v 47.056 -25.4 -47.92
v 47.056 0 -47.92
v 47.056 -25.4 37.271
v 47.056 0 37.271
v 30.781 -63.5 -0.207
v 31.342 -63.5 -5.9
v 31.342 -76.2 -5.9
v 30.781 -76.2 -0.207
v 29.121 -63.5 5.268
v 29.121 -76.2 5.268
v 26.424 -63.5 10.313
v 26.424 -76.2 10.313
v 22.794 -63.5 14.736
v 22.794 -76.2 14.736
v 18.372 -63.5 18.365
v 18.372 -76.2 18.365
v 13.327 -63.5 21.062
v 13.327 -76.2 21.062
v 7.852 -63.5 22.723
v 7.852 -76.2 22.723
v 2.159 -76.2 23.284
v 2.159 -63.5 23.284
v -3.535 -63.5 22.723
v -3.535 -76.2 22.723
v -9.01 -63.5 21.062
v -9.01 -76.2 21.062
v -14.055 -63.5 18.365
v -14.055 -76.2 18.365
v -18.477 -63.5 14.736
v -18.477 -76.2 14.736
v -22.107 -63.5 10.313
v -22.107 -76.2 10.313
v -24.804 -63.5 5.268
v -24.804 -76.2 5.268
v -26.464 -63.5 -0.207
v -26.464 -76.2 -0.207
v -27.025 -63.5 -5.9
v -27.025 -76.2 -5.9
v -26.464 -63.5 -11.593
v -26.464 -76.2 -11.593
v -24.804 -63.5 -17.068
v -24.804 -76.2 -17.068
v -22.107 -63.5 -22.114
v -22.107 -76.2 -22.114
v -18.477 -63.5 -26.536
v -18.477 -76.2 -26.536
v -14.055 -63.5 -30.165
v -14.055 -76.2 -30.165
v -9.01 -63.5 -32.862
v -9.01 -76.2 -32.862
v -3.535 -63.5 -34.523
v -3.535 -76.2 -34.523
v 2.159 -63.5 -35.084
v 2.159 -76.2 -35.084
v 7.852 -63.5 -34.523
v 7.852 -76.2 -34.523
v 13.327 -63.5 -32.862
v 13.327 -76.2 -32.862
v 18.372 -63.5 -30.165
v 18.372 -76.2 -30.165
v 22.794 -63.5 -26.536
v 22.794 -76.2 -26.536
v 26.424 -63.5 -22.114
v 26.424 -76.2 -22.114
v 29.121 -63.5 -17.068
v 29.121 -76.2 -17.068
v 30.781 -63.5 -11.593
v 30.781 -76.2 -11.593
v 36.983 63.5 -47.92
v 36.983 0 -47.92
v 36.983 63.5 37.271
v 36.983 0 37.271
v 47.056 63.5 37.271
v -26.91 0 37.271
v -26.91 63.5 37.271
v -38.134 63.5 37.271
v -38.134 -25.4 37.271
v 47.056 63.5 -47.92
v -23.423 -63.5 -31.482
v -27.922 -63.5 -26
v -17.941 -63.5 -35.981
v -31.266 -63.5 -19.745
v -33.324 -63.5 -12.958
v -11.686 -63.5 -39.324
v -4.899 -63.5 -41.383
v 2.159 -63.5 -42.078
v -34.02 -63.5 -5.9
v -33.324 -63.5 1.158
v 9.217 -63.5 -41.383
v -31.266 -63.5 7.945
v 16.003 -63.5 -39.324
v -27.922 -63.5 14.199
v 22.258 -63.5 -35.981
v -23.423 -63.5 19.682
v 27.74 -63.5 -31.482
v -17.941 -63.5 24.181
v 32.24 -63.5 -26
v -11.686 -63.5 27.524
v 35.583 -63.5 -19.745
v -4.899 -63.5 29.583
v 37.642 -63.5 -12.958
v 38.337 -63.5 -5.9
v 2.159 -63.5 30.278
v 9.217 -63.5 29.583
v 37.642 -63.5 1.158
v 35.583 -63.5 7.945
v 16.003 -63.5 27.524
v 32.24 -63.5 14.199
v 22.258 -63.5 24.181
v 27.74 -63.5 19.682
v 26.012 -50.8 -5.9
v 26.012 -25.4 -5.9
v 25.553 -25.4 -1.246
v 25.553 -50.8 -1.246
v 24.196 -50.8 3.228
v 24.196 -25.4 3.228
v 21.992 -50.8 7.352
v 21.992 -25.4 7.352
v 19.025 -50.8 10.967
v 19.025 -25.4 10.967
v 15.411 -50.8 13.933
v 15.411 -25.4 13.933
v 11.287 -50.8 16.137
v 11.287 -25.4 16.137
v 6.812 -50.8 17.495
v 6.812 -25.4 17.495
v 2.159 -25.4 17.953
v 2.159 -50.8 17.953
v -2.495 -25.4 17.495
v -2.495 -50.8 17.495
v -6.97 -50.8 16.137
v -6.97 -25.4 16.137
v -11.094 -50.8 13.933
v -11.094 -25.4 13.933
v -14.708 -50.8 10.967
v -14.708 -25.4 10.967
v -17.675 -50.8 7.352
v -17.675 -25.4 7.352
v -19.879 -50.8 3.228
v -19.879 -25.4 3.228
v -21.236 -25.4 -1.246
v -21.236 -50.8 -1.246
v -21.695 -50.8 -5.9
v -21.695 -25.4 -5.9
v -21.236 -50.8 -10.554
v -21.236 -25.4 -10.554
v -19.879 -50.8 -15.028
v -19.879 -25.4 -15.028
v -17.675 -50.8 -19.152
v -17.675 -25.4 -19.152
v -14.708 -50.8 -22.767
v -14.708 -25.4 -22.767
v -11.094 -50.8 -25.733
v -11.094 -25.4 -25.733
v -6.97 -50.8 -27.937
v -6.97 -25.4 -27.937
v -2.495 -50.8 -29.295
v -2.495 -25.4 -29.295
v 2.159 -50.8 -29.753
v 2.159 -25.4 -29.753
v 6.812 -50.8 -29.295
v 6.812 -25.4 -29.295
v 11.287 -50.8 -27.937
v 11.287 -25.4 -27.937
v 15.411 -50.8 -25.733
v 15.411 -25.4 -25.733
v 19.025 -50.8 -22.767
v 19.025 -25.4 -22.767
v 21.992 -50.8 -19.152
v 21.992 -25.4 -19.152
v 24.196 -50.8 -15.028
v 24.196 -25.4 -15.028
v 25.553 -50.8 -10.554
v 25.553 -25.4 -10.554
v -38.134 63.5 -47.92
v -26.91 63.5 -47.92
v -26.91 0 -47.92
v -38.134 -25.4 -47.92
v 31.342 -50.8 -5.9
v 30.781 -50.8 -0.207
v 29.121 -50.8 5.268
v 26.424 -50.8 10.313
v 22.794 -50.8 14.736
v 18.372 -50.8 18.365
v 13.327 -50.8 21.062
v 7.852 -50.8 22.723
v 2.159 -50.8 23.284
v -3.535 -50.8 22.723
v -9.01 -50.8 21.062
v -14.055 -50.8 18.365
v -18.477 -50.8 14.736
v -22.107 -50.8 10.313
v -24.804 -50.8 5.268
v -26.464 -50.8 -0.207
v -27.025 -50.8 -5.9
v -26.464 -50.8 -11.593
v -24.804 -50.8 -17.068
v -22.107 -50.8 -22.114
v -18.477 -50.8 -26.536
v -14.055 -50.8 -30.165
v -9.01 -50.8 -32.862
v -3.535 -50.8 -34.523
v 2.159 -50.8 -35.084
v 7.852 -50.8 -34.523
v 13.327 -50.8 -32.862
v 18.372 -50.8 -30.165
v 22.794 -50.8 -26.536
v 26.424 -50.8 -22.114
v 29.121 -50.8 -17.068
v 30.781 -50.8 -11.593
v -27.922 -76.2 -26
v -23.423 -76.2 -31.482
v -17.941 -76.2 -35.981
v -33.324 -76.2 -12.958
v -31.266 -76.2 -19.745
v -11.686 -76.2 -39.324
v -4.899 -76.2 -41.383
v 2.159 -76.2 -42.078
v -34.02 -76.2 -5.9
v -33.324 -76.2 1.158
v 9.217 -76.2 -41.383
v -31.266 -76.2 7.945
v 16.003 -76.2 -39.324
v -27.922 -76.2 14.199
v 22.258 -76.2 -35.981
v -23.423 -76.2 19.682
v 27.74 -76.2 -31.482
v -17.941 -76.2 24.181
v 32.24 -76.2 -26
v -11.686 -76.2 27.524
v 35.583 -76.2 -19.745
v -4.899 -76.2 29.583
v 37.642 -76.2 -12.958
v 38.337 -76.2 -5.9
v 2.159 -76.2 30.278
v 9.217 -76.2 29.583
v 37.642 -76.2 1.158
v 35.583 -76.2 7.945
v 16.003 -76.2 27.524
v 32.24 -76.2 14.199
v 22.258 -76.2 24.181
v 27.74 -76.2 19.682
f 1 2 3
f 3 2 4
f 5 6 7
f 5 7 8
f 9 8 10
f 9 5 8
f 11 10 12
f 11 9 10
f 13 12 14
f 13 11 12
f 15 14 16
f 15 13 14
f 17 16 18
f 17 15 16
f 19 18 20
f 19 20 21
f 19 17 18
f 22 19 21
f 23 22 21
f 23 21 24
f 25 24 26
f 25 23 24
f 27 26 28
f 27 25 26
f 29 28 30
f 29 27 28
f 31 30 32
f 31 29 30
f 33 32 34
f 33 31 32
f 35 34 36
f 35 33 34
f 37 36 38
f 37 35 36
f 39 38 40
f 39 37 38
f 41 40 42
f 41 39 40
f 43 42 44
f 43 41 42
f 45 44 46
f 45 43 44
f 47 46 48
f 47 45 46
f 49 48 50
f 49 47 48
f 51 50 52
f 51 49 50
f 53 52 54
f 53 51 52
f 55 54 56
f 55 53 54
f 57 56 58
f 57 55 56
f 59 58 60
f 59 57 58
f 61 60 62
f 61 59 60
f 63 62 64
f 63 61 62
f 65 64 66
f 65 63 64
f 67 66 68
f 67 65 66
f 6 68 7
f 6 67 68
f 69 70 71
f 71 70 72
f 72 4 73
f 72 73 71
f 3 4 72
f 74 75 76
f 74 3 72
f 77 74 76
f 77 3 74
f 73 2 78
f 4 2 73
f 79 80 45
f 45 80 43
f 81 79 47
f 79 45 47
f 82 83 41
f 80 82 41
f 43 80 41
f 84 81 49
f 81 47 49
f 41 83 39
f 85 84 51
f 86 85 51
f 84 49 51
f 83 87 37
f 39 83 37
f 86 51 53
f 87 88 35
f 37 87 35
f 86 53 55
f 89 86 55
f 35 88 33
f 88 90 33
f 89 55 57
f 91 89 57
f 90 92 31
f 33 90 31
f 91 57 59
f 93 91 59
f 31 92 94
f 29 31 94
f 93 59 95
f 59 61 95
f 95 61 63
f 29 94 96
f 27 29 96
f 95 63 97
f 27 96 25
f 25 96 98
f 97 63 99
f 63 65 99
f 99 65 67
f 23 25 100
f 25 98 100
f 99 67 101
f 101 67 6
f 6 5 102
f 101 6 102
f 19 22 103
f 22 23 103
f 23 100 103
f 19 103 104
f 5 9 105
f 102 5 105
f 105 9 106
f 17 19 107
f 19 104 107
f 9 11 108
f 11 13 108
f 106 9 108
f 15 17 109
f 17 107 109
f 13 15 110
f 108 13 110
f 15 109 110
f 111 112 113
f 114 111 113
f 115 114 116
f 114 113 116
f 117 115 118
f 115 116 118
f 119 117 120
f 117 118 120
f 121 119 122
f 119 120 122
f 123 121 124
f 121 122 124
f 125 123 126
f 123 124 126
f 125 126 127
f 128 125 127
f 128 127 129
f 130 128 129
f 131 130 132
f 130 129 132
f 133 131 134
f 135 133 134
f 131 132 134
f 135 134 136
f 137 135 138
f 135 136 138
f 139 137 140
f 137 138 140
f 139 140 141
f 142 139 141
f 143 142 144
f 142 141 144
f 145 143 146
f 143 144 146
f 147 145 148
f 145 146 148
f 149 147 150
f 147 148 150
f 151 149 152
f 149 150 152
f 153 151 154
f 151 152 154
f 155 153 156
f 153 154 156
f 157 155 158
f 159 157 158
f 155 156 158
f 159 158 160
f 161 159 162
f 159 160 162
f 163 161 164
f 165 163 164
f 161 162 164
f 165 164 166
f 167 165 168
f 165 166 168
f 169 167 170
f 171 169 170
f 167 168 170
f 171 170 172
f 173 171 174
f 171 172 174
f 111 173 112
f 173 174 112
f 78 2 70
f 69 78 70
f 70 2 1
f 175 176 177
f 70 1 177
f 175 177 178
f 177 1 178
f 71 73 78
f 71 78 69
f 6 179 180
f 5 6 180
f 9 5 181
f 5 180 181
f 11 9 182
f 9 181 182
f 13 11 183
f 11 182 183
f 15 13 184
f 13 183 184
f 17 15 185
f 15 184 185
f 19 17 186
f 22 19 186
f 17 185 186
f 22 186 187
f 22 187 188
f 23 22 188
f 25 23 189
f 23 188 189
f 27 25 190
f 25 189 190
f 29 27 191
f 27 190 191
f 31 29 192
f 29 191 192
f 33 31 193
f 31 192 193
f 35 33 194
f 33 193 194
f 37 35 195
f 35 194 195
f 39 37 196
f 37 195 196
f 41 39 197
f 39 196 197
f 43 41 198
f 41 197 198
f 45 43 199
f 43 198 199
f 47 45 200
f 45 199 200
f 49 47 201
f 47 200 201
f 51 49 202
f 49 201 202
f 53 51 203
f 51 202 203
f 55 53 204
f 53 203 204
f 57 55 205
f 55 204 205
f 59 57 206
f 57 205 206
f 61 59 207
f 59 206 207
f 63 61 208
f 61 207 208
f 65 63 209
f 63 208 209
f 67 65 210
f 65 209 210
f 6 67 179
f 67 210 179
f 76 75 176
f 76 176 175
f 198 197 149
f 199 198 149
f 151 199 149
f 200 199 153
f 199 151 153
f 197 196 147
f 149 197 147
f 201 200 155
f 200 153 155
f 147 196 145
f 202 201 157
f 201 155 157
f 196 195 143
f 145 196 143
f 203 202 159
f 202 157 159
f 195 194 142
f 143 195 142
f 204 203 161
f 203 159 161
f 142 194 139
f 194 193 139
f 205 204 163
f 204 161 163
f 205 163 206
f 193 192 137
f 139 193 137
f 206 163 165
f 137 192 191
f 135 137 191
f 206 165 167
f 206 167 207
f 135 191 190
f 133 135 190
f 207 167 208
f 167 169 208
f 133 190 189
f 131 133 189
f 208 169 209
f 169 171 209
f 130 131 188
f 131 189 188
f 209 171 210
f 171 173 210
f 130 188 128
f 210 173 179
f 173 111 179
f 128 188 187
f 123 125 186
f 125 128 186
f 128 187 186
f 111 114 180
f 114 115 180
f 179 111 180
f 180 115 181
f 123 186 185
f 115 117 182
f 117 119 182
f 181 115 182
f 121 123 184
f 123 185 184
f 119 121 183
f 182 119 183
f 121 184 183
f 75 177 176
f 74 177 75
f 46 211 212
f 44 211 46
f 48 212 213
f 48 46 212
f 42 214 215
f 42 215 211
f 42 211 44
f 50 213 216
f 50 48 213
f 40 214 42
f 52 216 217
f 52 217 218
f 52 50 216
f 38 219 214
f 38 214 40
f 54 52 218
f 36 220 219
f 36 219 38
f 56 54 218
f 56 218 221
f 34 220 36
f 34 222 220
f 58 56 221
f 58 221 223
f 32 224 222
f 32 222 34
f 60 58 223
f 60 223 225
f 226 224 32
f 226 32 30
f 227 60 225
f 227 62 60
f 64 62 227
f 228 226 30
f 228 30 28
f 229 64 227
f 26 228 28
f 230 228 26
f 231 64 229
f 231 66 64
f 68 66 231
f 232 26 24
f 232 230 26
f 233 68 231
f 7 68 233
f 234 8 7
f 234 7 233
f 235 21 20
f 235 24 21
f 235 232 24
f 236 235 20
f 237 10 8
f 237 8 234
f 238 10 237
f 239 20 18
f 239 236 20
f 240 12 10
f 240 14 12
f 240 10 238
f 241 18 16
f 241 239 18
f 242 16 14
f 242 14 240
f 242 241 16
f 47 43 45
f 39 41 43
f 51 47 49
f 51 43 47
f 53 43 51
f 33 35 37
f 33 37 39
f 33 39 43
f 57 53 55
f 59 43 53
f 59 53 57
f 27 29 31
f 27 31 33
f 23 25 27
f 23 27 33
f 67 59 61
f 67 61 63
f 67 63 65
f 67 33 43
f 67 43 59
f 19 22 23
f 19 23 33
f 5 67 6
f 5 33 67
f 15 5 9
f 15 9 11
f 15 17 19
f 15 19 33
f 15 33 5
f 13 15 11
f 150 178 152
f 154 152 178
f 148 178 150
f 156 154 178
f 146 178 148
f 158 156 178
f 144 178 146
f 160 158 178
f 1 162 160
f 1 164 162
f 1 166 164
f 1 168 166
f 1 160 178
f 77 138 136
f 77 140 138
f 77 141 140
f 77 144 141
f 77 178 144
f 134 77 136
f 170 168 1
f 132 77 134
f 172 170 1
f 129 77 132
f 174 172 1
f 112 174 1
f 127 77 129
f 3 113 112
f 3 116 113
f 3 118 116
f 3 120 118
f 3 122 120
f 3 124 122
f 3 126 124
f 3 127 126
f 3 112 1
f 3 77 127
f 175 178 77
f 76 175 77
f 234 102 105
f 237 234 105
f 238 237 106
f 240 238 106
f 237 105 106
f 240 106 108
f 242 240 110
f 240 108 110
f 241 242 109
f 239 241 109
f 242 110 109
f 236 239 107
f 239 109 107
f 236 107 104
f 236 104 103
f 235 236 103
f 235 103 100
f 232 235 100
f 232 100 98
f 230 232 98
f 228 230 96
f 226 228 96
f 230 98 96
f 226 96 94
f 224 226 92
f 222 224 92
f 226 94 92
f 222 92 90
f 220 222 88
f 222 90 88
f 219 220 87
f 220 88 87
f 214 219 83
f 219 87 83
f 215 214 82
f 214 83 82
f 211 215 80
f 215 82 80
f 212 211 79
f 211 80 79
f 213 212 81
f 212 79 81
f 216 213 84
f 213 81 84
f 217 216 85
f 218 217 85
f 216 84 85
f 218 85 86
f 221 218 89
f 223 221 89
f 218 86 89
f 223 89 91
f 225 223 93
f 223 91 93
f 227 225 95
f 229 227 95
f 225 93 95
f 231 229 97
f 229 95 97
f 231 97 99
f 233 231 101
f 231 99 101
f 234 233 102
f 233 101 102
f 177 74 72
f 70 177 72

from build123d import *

# Parameters (mm, degrees)
F0_W     = 85.190501
F0_H     = 85.190509
F1_DEPTH = 25.4
F2_W     = 10.0732
F2_H     = 85.190509
F2_W_2   = 11.224425
F3_DEPTH = 63.5
F4_R     = 23.853174
F5_DEPTH = 25.4
F6_R     = 29.183556
F7_DEPTH = 12.7
F8_R     = 36.178129
F8_R_2   = 29.183556
F9_DEPTH = 12.7


with BuildPart() as f1:
    # F0 (on Front) → F1 (new body)
    with BuildSketch(Plane.XZ):
        with Locations((4.460988, -5.324406)):
            Rectangle(F0_W, F0_H)
    extrude(amount=F1_DEPTH)

    # F2 (on face) → F3 (join)
    with BuildSketch(Plane(origin=(0, 0, 0), x_dir=(-1, 0, 0), z_dir=(0, 1, 0))):
        with Locations((-42.019639, -5.324406)):
            Rectangle(F2_W, F2_H)
        with Locations((32.52205, -5.324406)):
            Rectangle(F2_W_2, F2_H)
    extrude(amount=F3_DEPTH)

    # F4 (on face) → F5 (join)
    with BuildSketch(Plane.XZ.offset(25.4)):
        with Locations((2.158546, -5.900018)):
            Circle(F4_R)
    extrude(amount=F5_DEPTH)

    # F6 (on face) → F7 (join)
    with BuildSketch(Plane.XZ.offset(50.8)):
        with Locations((2.158546, -5.900018)):
            Circle(F6_R)
    extrude(amount=F7_DEPTH)


with BuildPart() as f9:
    # F8 (on face) → F9 (new body)
    with BuildSketch(Plane.XZ.offset(63.5)):
        with Locations((2.158546, -5.900018)):
            Circle(F8_R)
        with Locations((2.158546, -5.900018)):
            Circle(F8_R_2, mode=Mode.SUBTRACT)
    extrude(amount=F9_DEPTH)


solid = Compound([f1.part, f9.part])
